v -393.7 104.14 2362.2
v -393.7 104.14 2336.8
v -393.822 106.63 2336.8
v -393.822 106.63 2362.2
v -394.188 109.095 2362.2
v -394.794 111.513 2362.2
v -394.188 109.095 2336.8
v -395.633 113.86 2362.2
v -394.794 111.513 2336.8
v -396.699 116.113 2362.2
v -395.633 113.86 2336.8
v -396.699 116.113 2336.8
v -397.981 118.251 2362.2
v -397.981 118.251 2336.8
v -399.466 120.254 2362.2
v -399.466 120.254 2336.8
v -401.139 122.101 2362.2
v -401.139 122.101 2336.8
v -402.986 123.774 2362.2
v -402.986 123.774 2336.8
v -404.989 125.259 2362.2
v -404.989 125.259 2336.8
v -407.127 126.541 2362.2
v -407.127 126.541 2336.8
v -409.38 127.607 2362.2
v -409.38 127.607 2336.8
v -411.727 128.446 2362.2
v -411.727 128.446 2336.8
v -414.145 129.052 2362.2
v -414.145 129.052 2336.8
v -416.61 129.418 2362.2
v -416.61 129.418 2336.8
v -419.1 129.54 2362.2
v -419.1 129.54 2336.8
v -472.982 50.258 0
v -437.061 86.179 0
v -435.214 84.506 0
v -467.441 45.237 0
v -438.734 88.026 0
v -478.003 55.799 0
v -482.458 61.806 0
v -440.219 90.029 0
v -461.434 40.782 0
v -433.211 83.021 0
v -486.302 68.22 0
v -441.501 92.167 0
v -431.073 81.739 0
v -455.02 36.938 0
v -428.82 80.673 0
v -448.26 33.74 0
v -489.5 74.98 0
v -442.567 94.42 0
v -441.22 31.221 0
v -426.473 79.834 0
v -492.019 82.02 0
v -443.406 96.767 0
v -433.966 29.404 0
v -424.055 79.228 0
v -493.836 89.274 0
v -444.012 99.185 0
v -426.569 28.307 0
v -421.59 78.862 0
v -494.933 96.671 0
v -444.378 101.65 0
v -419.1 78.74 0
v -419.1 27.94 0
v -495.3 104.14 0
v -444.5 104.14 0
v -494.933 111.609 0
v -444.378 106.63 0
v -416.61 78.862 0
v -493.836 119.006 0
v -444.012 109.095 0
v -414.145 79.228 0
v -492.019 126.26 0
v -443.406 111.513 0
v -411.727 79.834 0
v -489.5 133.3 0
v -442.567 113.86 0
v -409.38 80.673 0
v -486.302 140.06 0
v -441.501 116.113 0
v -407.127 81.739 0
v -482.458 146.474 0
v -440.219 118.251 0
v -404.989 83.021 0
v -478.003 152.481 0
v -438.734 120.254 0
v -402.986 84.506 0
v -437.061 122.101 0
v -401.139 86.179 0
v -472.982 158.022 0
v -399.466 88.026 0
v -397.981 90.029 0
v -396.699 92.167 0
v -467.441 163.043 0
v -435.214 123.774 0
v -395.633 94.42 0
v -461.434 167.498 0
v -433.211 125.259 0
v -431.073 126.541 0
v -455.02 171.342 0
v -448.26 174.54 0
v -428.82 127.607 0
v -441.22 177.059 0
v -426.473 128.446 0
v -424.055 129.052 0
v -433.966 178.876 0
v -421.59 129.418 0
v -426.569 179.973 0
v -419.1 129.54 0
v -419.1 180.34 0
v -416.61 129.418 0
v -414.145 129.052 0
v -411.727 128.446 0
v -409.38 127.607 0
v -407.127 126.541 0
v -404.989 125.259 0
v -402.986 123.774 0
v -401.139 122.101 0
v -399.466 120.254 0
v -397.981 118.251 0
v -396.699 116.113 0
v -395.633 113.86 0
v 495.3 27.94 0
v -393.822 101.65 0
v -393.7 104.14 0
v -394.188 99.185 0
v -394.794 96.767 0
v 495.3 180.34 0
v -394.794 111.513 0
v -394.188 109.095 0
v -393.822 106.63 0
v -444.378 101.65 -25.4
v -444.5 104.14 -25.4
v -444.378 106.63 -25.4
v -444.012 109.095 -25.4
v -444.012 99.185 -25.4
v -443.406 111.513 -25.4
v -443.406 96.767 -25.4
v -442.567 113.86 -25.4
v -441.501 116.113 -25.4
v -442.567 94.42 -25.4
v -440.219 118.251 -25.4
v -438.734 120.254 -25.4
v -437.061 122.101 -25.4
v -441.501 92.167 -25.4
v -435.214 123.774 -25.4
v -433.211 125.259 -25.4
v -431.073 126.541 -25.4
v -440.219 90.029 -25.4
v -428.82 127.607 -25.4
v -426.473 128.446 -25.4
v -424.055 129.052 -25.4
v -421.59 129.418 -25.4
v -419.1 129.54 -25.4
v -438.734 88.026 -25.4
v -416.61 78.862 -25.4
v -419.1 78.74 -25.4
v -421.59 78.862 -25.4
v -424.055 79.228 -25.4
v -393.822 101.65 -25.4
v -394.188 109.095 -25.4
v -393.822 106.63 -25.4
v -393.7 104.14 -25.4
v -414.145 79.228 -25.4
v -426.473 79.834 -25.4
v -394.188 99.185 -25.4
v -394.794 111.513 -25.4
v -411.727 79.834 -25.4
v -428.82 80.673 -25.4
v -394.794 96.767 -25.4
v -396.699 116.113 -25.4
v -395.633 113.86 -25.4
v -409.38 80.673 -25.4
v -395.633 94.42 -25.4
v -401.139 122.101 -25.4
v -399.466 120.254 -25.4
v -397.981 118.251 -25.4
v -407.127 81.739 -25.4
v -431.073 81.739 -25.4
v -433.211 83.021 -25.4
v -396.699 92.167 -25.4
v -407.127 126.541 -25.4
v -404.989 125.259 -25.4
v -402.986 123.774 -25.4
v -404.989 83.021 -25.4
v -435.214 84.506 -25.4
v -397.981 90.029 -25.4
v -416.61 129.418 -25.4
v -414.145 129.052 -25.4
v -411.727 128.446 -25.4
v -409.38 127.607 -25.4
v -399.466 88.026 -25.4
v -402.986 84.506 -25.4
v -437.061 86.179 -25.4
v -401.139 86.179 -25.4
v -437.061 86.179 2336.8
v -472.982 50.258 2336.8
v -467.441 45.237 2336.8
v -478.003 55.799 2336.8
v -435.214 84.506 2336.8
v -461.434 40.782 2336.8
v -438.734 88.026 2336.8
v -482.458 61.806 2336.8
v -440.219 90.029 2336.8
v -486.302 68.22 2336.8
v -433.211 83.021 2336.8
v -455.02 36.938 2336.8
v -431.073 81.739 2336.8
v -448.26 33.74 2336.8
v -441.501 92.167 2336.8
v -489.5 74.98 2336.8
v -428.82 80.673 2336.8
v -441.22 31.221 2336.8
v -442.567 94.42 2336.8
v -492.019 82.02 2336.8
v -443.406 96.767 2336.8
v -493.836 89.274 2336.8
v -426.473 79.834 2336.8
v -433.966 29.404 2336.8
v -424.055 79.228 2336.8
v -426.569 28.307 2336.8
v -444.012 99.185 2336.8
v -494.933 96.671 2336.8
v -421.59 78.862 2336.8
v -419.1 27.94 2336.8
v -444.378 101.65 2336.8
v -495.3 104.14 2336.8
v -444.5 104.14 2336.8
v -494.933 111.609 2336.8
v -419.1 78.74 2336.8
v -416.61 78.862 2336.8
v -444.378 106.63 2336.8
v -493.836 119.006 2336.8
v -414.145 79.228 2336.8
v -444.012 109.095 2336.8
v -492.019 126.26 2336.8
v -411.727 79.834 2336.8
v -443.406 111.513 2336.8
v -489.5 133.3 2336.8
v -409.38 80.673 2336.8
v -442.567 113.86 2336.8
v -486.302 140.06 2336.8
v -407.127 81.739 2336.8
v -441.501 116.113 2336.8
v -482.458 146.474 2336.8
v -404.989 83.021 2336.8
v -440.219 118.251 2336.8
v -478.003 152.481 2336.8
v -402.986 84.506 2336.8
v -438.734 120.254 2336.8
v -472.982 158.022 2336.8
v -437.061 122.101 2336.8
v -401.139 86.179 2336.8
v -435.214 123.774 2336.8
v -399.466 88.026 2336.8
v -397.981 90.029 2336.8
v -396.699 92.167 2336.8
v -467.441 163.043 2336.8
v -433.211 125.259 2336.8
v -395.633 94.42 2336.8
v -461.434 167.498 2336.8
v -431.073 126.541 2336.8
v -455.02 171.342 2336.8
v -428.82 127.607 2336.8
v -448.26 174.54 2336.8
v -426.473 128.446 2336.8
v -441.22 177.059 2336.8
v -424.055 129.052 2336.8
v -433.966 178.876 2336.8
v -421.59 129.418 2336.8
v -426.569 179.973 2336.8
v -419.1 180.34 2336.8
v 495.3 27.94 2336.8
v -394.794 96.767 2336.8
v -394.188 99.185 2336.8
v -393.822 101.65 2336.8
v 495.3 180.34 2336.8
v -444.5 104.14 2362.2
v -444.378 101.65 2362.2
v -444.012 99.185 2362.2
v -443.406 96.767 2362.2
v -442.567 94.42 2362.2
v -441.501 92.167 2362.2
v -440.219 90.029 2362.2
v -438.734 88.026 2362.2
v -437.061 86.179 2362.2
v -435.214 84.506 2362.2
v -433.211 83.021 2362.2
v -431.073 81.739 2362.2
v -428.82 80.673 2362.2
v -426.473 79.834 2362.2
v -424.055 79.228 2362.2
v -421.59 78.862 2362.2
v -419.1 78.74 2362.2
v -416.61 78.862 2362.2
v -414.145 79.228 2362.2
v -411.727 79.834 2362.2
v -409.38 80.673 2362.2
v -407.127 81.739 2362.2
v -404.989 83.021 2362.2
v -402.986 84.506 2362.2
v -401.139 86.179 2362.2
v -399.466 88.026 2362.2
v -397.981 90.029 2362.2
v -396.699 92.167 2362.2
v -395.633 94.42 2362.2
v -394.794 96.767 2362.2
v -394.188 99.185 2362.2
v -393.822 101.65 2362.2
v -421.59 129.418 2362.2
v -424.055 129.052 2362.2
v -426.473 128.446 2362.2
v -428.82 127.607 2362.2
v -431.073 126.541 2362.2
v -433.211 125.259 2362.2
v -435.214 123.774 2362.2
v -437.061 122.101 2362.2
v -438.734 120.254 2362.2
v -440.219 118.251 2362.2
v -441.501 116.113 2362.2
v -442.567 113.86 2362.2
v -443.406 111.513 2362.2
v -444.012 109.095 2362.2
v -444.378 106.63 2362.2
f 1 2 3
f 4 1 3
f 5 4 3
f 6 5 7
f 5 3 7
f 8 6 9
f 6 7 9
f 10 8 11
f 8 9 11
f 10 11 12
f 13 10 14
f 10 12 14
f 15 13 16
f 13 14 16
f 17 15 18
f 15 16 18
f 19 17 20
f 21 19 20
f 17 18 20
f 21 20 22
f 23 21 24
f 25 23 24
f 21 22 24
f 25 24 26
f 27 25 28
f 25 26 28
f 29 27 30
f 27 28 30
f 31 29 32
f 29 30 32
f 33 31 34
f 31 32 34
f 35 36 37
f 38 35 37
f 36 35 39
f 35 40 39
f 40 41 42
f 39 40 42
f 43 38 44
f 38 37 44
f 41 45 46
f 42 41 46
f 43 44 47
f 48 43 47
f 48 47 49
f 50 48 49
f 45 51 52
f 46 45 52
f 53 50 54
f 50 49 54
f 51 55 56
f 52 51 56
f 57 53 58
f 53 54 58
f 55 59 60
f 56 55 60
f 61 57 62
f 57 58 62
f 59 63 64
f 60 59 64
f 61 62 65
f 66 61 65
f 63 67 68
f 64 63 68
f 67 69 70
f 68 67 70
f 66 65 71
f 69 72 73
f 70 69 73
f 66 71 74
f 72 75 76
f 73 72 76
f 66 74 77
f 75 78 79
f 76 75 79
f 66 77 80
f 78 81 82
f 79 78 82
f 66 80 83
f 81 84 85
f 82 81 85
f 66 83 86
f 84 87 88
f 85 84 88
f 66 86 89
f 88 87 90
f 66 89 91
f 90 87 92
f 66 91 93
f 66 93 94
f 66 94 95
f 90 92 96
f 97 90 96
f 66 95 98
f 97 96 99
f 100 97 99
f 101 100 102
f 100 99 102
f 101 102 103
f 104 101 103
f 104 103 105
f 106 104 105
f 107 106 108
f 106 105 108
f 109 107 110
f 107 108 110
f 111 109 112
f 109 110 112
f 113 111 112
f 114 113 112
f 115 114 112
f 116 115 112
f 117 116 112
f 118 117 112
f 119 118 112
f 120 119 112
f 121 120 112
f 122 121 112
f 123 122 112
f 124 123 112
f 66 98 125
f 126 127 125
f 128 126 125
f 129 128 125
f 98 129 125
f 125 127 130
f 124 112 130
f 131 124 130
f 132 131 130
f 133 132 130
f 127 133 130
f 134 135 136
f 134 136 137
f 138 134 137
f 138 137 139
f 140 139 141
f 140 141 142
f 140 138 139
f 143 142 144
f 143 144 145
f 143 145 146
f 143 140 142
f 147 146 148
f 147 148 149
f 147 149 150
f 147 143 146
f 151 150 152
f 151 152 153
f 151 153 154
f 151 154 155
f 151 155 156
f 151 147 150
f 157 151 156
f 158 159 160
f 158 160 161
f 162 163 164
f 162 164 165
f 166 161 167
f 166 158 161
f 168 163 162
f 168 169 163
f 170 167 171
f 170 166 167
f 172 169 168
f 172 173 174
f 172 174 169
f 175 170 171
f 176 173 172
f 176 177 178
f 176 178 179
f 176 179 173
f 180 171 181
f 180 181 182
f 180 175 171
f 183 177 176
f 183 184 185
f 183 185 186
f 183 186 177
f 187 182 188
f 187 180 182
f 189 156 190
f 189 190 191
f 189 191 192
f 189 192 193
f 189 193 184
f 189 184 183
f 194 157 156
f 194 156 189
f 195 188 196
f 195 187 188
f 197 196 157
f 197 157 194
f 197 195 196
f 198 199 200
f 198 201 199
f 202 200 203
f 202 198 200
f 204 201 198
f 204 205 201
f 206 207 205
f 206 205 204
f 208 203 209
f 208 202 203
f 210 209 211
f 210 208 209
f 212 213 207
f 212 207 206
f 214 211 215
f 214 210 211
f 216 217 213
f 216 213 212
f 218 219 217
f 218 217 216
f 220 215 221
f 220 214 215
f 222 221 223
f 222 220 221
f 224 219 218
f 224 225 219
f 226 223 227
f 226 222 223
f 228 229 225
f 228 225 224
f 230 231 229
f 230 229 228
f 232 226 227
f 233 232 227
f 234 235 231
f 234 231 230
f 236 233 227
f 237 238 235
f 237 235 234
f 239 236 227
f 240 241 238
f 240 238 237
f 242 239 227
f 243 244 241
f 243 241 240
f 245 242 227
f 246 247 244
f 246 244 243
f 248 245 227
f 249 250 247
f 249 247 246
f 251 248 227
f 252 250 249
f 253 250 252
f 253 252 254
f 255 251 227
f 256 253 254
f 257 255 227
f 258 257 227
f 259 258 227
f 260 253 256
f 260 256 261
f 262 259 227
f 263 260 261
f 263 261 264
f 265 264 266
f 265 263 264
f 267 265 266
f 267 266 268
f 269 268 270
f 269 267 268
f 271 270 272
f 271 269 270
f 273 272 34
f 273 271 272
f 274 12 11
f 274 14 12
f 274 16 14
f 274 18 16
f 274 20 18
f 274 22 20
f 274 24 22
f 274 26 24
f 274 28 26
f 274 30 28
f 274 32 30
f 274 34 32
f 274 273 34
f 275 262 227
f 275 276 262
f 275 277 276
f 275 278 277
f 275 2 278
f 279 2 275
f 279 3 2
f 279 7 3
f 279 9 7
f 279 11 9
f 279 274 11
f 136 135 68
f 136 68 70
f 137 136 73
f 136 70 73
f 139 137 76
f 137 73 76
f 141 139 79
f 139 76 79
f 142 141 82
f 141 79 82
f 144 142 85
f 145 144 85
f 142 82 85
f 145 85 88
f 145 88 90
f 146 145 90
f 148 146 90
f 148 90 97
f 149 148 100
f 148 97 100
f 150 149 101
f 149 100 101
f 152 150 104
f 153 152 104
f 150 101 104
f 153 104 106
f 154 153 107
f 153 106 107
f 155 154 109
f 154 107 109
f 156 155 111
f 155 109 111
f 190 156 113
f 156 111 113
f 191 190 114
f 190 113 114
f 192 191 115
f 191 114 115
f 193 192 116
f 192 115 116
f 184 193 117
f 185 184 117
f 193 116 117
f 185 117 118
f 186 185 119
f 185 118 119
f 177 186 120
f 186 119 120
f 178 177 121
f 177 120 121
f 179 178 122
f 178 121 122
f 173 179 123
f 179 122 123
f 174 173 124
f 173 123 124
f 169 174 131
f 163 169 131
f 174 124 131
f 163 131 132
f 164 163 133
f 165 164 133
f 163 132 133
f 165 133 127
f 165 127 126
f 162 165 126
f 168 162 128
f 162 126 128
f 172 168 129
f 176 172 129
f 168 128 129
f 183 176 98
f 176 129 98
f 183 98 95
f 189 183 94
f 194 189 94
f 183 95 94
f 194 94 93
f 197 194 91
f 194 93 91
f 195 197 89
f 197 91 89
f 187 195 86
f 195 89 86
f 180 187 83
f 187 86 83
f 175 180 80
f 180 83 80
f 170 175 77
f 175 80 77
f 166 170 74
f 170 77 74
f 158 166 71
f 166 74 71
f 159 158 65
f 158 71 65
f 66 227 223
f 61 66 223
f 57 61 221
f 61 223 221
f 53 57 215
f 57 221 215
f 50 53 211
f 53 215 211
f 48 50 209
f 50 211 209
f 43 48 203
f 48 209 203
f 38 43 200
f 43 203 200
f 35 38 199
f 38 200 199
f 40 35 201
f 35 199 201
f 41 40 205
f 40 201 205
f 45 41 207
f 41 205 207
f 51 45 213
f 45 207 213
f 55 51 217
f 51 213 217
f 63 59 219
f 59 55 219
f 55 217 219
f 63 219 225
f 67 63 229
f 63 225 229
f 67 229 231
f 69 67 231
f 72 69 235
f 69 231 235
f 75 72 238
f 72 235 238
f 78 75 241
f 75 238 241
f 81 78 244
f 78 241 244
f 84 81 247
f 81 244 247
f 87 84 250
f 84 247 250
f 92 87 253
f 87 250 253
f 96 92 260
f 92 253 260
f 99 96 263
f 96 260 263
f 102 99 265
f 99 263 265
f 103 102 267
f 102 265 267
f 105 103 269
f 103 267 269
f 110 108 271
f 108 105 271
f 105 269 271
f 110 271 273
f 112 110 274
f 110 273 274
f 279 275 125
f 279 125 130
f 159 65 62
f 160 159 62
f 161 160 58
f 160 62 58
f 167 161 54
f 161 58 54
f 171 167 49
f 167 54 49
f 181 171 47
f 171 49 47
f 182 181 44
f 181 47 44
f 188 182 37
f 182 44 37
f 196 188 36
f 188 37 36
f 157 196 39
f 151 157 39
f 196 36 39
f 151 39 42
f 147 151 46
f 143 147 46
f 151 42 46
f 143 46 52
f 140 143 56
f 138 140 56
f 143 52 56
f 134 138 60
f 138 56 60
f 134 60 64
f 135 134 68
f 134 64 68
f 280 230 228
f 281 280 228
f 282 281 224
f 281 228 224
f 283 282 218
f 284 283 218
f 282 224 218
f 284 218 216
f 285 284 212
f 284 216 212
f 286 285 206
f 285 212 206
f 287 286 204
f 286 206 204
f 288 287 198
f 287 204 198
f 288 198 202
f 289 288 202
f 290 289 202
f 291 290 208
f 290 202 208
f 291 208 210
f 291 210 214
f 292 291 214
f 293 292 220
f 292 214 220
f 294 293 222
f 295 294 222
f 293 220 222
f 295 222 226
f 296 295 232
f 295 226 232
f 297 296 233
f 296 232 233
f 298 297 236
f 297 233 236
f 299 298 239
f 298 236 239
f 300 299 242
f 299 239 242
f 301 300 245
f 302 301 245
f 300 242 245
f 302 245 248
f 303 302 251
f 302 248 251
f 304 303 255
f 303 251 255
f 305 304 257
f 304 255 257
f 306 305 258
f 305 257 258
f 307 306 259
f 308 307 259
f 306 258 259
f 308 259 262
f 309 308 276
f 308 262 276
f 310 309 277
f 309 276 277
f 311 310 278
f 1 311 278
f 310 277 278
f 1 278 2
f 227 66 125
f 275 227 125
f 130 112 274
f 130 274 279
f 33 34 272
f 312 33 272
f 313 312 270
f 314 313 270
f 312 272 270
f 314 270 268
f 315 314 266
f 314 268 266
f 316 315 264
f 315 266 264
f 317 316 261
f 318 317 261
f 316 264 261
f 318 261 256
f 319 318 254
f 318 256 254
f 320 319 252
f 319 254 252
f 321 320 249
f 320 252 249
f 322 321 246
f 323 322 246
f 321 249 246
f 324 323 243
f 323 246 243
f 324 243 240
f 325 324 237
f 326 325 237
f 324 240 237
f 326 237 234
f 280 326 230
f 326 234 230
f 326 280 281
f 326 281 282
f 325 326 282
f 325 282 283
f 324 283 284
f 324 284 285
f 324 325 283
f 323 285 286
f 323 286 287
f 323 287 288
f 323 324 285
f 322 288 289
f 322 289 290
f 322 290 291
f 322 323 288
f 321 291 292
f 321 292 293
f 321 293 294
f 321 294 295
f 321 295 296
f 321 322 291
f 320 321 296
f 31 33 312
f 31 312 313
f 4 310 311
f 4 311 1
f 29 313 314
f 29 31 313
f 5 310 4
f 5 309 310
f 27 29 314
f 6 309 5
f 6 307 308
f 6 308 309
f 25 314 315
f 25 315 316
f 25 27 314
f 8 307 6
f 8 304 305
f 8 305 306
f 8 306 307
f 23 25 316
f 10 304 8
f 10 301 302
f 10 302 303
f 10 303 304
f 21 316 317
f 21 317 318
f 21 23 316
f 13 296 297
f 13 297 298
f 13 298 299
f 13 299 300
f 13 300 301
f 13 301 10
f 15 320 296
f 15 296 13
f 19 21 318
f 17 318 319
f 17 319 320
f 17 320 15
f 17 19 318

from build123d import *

# Parameters (mm, degrees)
F0_W     = 990.6
F0_H     = 152.4
F1_DEPTH = 2336.8
F3_DEPTH = 25.4
F5_DEPTH = 25.4
F7_DEPTH = 2387.6


with BuildPart() as f1:
    # F0 (on Top) → F1 (new body)
    with BuildSketch(Plane.XY):
        with Locations((0, 104.140009)):
            Rectangle(F0_W, F0_H)
    extrude(amount=F1_DEPTH)

    # F2 (on face) → F3 (join)
    with BuildSketch(Plane.XY.offset(2336.8)):
        with BuildLine():
            Line((-419.1, 104.140009), (-419.1, 129.540009))
            ThreePointArc((-419.1, 129.540009), (-437.060512, 122.100521), (-444.5, 104.140009))
            Line((-444.5, 104.140009), (-419.1, 104.140009))
        make_face()
        with BuildLine():
            ThreePointArc((-393.7, 104.140009), (-401.139488, 122.100521), (-419.1, 129.540009))
            Line((-419.1, 129.540009), (-419.1, 104.140009))
            Line((-419.1, 104.140009), (-444.5, 104.140009))
            ThreePointArc((-444.5, 104.140009), (-419.1, 78.740009), (-393.7, 104.140009))
        make_face()
    extrude(amount=F3_DEPTH)

    # F4 (on face) → F5 (join)
    with BuildSketch(Plane(origin=(0, 0, 0), x_dir=(1, 0, 0), z_dir=(0, 0, -1))):
        with BuildLine():
            Line((-419.1, -104.140009), (-419.1, -78.740009))
            ThreePointArc((-419.1, -78.740009), (-437.060512, -86.179497), (-444.5, -104.140009))
            Line((-444.5, -104.140009), (-419.1, -104.140009))
        make_face()
        with BuildLine():
            ThreePointArc((-393.7, -104.140009), (-401.139488, -86.179497), (-419.1, -78.740009))
            Line((-419.1, -78.740009), (-419.1, -104.140009))
            Line((-419.1, -104.140009), (-444.5, -104.140009))
            ThreePointArc((-444.5, -104.140009), (-419.1, -129.540009), (-393.7, -104.140009))
        make_face()
    extrude(amount=F5_DEPTH)

    # F6 (on face) → F7 (cut)
    with BuildSketch(Plane.XY.offset(2336.8)):
        with BuildLine():
            Line((-495.3, 27.940009), (-419.1, 27.940009))
            ThreePointArc((-419.1, 27.940009), (-472.981537, 50.258472), (-495.3, 104.140009))
            Line((-495.3, 104.140009), (-495.3, 27.940009))
        make_face()
        with BuildLine():
            ThreePointArc((-495.3, 104.140009), (-472.981537, 158.021546), (-419.1, 180.340009))
            Line((-419.1, 180.340009), (-495.3, 180.340009))
            Line((-495.3, 180.340009), (-495.3, 104.140009))
        make_face()
    extrude(amount=-F7_DEPTH, mode=Mode.SUBTRACT)


solid = f1.part
